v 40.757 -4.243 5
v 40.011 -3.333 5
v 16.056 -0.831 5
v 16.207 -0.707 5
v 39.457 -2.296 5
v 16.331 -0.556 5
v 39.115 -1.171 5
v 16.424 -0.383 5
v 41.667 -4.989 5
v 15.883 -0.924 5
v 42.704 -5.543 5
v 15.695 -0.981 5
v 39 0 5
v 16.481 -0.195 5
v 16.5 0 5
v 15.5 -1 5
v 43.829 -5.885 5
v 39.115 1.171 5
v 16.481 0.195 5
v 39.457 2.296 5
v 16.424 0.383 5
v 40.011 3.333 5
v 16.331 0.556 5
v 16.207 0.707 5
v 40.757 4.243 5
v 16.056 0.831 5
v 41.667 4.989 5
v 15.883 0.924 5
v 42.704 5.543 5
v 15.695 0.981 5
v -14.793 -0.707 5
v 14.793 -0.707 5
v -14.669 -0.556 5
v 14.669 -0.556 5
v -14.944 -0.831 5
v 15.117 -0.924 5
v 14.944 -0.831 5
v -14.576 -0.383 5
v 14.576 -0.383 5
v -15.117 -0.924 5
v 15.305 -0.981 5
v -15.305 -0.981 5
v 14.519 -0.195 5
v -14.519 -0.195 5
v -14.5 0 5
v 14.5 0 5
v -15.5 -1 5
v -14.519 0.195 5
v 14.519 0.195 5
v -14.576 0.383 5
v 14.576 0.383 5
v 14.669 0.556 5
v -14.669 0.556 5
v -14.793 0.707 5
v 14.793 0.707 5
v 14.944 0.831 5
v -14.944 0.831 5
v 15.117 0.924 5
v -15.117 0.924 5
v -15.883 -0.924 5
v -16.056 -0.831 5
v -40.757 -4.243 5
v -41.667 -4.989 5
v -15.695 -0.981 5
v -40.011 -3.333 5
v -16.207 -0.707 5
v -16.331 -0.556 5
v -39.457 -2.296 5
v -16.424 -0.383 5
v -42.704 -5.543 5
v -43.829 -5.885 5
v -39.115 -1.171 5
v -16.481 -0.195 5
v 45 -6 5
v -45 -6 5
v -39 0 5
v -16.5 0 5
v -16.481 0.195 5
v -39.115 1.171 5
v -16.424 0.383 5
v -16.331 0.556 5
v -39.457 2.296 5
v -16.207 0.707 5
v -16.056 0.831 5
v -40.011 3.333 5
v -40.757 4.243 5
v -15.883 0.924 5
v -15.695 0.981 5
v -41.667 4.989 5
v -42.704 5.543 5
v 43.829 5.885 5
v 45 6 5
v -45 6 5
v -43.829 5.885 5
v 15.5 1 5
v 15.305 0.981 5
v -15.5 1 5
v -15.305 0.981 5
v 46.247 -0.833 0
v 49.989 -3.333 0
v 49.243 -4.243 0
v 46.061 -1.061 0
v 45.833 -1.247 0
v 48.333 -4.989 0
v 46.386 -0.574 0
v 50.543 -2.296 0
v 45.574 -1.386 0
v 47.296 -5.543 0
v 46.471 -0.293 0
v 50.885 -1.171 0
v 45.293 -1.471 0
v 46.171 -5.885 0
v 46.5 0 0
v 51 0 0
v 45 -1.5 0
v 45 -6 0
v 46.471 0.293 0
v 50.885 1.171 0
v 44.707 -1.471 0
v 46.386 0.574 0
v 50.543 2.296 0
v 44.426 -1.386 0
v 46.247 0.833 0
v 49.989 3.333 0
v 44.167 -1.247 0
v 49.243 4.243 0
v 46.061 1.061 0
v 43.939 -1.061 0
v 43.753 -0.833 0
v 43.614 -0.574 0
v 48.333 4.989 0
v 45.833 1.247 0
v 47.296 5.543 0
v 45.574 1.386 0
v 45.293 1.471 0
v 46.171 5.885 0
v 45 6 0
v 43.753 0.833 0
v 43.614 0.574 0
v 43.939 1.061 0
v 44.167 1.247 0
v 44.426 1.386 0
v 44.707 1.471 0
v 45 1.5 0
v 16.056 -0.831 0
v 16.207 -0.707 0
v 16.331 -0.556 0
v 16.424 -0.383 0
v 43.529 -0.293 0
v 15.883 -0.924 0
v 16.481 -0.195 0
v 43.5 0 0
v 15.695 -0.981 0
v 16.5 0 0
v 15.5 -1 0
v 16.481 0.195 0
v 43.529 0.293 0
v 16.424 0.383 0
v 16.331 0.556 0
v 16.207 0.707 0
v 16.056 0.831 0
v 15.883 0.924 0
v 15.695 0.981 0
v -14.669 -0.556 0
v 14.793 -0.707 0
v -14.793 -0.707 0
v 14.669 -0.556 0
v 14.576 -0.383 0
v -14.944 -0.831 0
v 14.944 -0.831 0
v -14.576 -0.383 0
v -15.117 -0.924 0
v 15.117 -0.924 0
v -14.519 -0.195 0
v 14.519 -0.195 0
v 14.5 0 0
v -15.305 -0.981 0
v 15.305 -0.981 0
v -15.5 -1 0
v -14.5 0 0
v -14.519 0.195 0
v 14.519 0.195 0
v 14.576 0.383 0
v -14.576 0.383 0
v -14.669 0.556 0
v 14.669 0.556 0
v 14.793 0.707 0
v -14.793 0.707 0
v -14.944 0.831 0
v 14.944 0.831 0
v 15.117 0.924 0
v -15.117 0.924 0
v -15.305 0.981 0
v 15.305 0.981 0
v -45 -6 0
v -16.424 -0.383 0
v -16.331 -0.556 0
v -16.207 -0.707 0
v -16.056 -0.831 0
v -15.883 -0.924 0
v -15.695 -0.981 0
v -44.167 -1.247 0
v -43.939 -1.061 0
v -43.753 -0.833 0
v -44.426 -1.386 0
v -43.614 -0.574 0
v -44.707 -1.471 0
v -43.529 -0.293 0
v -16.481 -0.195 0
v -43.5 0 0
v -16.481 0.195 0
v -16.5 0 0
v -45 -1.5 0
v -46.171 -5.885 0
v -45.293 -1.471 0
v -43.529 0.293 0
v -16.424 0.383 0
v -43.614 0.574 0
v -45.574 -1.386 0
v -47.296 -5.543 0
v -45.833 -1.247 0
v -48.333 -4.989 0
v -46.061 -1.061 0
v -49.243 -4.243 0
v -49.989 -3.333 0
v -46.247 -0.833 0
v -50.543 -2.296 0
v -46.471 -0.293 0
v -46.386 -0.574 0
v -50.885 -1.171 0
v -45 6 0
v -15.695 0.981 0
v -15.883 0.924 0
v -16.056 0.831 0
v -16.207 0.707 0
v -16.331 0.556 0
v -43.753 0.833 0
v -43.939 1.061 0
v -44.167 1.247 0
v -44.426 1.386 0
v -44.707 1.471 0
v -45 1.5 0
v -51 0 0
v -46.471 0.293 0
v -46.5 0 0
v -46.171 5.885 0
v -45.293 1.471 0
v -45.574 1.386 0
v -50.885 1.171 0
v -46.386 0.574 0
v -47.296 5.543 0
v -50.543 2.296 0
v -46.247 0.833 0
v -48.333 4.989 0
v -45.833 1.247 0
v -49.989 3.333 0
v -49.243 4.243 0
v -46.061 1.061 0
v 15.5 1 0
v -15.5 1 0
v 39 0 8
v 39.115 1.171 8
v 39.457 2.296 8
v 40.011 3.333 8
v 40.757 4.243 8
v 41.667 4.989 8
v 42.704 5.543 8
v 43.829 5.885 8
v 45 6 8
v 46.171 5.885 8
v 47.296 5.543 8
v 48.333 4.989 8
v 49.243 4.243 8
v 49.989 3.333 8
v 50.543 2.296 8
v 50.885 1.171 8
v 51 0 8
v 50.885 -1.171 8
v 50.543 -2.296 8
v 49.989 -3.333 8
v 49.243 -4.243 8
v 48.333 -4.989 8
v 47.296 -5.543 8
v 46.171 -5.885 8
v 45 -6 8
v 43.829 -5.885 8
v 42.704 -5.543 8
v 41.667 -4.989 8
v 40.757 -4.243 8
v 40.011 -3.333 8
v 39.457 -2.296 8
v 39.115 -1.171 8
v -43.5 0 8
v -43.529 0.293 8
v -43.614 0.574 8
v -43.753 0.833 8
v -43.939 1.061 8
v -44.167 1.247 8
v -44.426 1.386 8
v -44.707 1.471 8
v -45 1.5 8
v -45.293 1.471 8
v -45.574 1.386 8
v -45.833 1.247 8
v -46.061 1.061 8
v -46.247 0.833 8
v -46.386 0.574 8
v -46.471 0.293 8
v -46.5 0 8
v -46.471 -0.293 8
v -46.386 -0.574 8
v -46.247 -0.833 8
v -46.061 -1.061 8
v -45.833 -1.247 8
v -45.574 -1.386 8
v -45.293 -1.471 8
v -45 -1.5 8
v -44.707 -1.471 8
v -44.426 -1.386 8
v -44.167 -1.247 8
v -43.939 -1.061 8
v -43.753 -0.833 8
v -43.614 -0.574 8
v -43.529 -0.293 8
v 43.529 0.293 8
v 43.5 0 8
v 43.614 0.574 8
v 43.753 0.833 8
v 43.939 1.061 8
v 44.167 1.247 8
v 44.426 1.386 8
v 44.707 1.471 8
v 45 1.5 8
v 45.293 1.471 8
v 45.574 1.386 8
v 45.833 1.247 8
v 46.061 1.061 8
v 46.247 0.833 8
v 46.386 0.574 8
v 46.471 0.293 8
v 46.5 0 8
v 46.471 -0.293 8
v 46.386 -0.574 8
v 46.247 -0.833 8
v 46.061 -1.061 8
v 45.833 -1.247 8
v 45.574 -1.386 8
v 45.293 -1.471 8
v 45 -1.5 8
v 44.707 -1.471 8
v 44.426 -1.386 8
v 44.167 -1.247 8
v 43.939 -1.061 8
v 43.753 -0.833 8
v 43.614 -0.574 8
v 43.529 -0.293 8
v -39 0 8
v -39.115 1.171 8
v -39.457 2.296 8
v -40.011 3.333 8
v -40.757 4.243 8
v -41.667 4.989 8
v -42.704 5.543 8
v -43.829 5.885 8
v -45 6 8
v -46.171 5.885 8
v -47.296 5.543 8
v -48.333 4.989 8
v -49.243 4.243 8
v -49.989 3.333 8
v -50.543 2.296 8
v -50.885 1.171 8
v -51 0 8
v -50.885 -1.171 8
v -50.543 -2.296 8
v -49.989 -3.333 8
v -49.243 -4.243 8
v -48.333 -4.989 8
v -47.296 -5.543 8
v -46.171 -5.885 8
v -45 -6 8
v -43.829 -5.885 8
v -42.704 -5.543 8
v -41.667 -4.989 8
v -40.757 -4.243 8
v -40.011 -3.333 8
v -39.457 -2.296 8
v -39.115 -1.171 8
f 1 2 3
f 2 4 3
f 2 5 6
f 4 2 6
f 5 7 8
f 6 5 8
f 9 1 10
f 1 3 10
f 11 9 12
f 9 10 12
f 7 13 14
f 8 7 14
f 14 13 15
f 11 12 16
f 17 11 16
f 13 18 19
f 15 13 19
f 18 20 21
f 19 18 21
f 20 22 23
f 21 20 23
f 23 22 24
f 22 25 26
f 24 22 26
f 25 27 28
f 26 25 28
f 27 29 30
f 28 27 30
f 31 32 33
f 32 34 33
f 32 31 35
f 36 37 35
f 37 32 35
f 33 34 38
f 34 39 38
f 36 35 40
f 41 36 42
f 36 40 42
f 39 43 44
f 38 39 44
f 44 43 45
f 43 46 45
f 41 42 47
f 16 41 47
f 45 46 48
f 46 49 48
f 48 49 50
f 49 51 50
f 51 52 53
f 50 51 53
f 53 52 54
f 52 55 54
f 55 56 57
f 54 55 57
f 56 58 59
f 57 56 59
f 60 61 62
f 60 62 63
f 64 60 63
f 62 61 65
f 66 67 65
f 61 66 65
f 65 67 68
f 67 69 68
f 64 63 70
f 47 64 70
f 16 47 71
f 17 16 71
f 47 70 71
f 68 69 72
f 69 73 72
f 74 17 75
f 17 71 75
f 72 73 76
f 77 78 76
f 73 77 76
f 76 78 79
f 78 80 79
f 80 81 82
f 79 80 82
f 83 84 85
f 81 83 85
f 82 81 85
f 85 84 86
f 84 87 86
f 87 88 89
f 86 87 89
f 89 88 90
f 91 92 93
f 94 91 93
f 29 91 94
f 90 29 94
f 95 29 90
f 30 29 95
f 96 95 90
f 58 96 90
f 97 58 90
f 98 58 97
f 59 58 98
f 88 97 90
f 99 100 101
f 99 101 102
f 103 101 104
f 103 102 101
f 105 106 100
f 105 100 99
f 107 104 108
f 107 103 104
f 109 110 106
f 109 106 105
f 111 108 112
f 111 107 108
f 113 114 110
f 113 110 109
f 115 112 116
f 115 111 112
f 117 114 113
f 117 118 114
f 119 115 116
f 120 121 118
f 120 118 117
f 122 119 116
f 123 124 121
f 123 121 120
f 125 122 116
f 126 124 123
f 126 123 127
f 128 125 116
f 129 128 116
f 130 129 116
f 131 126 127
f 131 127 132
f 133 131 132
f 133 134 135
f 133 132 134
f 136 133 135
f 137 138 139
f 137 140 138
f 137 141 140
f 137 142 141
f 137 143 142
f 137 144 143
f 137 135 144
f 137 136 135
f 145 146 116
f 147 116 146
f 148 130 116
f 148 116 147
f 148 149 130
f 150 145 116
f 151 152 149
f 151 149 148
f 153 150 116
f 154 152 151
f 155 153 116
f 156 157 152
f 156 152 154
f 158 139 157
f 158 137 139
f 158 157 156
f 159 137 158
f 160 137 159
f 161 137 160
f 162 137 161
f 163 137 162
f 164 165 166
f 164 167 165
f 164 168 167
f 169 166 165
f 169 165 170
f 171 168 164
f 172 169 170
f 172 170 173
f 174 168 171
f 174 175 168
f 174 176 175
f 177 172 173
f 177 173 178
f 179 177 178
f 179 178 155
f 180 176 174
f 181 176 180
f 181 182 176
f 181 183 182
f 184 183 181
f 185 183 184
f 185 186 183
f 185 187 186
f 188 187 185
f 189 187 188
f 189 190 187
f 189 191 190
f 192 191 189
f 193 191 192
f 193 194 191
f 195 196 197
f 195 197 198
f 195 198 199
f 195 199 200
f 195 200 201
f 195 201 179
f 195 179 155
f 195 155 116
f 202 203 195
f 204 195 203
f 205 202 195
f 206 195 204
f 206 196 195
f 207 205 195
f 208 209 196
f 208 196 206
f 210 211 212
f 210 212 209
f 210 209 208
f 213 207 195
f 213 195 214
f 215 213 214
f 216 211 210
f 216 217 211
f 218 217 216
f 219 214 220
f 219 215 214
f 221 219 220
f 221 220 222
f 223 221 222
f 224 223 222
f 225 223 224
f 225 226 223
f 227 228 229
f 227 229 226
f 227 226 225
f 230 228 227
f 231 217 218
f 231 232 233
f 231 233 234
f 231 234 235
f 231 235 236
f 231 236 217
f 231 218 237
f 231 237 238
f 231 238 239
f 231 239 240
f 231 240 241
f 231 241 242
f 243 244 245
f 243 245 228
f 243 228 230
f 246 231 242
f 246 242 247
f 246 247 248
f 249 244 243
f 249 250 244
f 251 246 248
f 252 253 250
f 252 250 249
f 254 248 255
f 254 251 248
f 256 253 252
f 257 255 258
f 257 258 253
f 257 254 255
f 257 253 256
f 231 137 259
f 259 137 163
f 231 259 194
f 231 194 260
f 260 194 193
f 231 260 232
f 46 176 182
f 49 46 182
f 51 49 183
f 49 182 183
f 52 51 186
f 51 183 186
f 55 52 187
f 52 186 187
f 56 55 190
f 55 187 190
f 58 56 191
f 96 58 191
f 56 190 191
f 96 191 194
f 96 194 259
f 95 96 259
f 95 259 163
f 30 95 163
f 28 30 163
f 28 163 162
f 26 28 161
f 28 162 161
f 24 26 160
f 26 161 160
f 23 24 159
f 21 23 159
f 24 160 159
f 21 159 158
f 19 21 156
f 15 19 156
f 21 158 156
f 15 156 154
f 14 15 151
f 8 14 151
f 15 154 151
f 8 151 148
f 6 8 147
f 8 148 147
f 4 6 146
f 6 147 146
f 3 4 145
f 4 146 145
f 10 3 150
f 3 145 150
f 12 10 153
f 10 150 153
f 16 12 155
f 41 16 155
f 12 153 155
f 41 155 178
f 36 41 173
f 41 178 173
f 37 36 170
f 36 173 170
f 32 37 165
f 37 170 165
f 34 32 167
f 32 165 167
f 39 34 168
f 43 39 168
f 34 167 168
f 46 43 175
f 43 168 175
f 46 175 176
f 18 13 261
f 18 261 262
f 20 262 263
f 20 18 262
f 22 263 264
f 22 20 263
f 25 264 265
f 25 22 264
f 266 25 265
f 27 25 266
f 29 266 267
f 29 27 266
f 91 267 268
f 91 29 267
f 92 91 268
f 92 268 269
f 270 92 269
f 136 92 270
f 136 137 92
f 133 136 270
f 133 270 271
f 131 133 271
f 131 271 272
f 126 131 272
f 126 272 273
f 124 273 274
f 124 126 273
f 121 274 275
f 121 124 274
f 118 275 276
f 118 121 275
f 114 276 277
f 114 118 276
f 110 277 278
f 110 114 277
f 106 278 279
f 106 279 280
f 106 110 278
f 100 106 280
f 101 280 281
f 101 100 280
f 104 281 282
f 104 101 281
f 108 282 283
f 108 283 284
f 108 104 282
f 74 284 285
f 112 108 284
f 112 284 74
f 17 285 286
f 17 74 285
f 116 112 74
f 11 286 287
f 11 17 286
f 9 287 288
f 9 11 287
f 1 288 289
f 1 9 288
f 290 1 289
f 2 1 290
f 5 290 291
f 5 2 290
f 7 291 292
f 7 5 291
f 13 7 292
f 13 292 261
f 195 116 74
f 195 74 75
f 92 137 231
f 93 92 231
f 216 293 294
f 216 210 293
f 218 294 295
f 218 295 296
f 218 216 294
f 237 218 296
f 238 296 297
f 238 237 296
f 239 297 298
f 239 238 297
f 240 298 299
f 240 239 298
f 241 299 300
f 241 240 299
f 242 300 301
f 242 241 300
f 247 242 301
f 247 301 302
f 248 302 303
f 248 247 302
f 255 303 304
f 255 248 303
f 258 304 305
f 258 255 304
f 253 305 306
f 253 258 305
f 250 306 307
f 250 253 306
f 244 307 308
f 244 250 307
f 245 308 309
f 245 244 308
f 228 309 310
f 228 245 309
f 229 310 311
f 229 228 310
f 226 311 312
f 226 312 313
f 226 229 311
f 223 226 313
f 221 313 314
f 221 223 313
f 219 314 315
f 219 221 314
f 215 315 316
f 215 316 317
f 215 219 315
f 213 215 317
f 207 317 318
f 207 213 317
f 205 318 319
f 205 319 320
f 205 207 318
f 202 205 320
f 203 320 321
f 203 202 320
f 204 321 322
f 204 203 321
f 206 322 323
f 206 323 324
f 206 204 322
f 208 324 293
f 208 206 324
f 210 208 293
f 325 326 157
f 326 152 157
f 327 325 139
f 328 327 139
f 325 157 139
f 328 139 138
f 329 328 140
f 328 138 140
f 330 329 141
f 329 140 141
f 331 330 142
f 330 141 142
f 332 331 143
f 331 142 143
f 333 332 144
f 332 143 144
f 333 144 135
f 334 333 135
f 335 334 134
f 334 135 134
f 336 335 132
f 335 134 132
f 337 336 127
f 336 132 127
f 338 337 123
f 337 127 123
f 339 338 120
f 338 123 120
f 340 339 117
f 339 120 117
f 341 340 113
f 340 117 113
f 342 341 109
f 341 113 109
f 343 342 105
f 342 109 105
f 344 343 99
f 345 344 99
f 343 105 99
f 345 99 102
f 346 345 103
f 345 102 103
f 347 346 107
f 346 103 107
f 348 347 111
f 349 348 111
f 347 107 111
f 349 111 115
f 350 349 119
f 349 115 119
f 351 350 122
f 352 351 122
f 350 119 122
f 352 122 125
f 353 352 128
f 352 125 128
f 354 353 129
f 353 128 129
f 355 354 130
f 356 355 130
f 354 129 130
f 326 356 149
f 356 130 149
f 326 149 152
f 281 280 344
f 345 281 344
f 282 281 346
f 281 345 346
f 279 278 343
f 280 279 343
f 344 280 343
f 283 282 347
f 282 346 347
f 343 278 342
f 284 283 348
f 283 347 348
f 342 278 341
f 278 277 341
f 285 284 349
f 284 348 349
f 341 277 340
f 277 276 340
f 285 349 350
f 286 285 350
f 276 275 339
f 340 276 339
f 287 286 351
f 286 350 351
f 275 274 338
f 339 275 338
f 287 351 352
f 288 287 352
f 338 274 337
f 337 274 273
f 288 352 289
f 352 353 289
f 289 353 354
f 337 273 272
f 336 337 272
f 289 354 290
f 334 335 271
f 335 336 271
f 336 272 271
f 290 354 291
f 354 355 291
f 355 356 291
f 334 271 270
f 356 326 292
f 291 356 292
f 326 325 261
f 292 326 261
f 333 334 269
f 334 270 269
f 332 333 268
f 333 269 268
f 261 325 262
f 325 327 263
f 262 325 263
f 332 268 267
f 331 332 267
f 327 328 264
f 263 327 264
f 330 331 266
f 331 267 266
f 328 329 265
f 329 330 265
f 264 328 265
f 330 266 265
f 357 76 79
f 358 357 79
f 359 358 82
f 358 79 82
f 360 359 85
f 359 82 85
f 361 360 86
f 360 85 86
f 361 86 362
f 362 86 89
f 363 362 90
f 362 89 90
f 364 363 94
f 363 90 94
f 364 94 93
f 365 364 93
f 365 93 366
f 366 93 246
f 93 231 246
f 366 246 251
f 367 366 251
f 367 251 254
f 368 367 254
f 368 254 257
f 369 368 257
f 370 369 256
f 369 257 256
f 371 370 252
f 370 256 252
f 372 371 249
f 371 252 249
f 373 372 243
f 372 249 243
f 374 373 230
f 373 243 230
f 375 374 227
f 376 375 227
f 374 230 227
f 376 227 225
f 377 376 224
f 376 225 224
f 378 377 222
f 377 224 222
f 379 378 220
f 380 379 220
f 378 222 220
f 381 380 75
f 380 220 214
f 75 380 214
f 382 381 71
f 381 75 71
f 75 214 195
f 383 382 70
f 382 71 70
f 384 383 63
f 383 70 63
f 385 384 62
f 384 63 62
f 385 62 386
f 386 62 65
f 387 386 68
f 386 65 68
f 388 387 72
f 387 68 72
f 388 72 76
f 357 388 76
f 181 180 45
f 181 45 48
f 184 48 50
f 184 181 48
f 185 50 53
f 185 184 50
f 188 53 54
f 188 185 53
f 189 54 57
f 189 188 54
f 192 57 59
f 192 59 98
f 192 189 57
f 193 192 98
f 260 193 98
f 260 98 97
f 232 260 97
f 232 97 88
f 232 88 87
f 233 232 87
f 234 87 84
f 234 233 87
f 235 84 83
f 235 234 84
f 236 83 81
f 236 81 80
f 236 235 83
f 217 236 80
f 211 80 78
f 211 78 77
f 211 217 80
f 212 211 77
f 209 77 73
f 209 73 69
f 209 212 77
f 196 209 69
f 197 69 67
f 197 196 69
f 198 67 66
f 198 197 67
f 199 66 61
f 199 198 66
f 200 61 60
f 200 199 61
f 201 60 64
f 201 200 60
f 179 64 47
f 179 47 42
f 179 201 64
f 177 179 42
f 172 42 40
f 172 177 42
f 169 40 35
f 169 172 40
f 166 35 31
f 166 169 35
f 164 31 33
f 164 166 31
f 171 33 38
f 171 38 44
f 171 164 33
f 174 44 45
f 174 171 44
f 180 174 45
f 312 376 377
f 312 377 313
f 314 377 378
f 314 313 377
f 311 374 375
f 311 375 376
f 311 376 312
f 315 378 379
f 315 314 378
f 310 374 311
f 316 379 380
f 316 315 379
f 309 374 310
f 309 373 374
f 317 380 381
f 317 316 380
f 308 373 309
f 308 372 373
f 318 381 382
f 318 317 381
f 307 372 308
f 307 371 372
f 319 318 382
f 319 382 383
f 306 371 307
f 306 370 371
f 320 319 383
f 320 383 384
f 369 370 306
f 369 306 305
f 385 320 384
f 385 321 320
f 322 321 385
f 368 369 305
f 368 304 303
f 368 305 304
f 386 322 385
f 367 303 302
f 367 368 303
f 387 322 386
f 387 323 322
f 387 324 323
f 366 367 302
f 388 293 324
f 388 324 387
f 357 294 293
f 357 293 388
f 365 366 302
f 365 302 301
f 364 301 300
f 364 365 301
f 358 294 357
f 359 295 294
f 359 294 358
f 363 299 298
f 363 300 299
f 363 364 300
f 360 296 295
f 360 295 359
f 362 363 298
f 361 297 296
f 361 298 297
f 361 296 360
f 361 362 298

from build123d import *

# Parameters (mm, degrees)
SKETCH_R      = 1.5
SKETCH_R_2    = 1
PAD_DEPTH     = 5
SKETCH001_R   = 6
SKETCH001_R_2 = 1.5
PAD001_DEPTH  = 3


with BuildPart() as part:
    # Sketch → Pad (new body)
    with BuildSketch(Plane.XY):
        with BuildLine():
            ThreePointArc((-45, 6), (-51, 0), (-45, -6))
            Line((-45, -6), (0, -6))
            Line((0, -6), (0, 6))
            Line((-45, 6), (0, 6))
        make_face()
        with Locations((-45, 0)):
            Circle(SKETCH_R, mode=Mode.SUBTRACT)
        with Locations((-15.5, 0)):
            Circle(SKETCH_R_2, mode=Mode.SUBTRACT)
    extrude(amount=PAD_DEPTH)

    # Sketch001 (on Face8 of Pad) → Pad001 (join)
    with BuildSketch(Plane.XY.offset(5)):
        with Locations((-45, 0)):
            Circle(SKETCH001_R)
        with Locations((-45, 0)):
            Circle(SKETCH001_R_2, mode=Mode.SUBTRACT)
    extrude(amount=PAD001_DEPTH)

    # Mirrored: part across Sketch001 V_Axis


with BuildPart() as part_1:
    add(part.part)
    add(part.part.mirror(Plane(origin=(0, 0, 5), x_dir=(0, 0, 1), z_dir=(1, 0, 0))))


solid = part_1.part
